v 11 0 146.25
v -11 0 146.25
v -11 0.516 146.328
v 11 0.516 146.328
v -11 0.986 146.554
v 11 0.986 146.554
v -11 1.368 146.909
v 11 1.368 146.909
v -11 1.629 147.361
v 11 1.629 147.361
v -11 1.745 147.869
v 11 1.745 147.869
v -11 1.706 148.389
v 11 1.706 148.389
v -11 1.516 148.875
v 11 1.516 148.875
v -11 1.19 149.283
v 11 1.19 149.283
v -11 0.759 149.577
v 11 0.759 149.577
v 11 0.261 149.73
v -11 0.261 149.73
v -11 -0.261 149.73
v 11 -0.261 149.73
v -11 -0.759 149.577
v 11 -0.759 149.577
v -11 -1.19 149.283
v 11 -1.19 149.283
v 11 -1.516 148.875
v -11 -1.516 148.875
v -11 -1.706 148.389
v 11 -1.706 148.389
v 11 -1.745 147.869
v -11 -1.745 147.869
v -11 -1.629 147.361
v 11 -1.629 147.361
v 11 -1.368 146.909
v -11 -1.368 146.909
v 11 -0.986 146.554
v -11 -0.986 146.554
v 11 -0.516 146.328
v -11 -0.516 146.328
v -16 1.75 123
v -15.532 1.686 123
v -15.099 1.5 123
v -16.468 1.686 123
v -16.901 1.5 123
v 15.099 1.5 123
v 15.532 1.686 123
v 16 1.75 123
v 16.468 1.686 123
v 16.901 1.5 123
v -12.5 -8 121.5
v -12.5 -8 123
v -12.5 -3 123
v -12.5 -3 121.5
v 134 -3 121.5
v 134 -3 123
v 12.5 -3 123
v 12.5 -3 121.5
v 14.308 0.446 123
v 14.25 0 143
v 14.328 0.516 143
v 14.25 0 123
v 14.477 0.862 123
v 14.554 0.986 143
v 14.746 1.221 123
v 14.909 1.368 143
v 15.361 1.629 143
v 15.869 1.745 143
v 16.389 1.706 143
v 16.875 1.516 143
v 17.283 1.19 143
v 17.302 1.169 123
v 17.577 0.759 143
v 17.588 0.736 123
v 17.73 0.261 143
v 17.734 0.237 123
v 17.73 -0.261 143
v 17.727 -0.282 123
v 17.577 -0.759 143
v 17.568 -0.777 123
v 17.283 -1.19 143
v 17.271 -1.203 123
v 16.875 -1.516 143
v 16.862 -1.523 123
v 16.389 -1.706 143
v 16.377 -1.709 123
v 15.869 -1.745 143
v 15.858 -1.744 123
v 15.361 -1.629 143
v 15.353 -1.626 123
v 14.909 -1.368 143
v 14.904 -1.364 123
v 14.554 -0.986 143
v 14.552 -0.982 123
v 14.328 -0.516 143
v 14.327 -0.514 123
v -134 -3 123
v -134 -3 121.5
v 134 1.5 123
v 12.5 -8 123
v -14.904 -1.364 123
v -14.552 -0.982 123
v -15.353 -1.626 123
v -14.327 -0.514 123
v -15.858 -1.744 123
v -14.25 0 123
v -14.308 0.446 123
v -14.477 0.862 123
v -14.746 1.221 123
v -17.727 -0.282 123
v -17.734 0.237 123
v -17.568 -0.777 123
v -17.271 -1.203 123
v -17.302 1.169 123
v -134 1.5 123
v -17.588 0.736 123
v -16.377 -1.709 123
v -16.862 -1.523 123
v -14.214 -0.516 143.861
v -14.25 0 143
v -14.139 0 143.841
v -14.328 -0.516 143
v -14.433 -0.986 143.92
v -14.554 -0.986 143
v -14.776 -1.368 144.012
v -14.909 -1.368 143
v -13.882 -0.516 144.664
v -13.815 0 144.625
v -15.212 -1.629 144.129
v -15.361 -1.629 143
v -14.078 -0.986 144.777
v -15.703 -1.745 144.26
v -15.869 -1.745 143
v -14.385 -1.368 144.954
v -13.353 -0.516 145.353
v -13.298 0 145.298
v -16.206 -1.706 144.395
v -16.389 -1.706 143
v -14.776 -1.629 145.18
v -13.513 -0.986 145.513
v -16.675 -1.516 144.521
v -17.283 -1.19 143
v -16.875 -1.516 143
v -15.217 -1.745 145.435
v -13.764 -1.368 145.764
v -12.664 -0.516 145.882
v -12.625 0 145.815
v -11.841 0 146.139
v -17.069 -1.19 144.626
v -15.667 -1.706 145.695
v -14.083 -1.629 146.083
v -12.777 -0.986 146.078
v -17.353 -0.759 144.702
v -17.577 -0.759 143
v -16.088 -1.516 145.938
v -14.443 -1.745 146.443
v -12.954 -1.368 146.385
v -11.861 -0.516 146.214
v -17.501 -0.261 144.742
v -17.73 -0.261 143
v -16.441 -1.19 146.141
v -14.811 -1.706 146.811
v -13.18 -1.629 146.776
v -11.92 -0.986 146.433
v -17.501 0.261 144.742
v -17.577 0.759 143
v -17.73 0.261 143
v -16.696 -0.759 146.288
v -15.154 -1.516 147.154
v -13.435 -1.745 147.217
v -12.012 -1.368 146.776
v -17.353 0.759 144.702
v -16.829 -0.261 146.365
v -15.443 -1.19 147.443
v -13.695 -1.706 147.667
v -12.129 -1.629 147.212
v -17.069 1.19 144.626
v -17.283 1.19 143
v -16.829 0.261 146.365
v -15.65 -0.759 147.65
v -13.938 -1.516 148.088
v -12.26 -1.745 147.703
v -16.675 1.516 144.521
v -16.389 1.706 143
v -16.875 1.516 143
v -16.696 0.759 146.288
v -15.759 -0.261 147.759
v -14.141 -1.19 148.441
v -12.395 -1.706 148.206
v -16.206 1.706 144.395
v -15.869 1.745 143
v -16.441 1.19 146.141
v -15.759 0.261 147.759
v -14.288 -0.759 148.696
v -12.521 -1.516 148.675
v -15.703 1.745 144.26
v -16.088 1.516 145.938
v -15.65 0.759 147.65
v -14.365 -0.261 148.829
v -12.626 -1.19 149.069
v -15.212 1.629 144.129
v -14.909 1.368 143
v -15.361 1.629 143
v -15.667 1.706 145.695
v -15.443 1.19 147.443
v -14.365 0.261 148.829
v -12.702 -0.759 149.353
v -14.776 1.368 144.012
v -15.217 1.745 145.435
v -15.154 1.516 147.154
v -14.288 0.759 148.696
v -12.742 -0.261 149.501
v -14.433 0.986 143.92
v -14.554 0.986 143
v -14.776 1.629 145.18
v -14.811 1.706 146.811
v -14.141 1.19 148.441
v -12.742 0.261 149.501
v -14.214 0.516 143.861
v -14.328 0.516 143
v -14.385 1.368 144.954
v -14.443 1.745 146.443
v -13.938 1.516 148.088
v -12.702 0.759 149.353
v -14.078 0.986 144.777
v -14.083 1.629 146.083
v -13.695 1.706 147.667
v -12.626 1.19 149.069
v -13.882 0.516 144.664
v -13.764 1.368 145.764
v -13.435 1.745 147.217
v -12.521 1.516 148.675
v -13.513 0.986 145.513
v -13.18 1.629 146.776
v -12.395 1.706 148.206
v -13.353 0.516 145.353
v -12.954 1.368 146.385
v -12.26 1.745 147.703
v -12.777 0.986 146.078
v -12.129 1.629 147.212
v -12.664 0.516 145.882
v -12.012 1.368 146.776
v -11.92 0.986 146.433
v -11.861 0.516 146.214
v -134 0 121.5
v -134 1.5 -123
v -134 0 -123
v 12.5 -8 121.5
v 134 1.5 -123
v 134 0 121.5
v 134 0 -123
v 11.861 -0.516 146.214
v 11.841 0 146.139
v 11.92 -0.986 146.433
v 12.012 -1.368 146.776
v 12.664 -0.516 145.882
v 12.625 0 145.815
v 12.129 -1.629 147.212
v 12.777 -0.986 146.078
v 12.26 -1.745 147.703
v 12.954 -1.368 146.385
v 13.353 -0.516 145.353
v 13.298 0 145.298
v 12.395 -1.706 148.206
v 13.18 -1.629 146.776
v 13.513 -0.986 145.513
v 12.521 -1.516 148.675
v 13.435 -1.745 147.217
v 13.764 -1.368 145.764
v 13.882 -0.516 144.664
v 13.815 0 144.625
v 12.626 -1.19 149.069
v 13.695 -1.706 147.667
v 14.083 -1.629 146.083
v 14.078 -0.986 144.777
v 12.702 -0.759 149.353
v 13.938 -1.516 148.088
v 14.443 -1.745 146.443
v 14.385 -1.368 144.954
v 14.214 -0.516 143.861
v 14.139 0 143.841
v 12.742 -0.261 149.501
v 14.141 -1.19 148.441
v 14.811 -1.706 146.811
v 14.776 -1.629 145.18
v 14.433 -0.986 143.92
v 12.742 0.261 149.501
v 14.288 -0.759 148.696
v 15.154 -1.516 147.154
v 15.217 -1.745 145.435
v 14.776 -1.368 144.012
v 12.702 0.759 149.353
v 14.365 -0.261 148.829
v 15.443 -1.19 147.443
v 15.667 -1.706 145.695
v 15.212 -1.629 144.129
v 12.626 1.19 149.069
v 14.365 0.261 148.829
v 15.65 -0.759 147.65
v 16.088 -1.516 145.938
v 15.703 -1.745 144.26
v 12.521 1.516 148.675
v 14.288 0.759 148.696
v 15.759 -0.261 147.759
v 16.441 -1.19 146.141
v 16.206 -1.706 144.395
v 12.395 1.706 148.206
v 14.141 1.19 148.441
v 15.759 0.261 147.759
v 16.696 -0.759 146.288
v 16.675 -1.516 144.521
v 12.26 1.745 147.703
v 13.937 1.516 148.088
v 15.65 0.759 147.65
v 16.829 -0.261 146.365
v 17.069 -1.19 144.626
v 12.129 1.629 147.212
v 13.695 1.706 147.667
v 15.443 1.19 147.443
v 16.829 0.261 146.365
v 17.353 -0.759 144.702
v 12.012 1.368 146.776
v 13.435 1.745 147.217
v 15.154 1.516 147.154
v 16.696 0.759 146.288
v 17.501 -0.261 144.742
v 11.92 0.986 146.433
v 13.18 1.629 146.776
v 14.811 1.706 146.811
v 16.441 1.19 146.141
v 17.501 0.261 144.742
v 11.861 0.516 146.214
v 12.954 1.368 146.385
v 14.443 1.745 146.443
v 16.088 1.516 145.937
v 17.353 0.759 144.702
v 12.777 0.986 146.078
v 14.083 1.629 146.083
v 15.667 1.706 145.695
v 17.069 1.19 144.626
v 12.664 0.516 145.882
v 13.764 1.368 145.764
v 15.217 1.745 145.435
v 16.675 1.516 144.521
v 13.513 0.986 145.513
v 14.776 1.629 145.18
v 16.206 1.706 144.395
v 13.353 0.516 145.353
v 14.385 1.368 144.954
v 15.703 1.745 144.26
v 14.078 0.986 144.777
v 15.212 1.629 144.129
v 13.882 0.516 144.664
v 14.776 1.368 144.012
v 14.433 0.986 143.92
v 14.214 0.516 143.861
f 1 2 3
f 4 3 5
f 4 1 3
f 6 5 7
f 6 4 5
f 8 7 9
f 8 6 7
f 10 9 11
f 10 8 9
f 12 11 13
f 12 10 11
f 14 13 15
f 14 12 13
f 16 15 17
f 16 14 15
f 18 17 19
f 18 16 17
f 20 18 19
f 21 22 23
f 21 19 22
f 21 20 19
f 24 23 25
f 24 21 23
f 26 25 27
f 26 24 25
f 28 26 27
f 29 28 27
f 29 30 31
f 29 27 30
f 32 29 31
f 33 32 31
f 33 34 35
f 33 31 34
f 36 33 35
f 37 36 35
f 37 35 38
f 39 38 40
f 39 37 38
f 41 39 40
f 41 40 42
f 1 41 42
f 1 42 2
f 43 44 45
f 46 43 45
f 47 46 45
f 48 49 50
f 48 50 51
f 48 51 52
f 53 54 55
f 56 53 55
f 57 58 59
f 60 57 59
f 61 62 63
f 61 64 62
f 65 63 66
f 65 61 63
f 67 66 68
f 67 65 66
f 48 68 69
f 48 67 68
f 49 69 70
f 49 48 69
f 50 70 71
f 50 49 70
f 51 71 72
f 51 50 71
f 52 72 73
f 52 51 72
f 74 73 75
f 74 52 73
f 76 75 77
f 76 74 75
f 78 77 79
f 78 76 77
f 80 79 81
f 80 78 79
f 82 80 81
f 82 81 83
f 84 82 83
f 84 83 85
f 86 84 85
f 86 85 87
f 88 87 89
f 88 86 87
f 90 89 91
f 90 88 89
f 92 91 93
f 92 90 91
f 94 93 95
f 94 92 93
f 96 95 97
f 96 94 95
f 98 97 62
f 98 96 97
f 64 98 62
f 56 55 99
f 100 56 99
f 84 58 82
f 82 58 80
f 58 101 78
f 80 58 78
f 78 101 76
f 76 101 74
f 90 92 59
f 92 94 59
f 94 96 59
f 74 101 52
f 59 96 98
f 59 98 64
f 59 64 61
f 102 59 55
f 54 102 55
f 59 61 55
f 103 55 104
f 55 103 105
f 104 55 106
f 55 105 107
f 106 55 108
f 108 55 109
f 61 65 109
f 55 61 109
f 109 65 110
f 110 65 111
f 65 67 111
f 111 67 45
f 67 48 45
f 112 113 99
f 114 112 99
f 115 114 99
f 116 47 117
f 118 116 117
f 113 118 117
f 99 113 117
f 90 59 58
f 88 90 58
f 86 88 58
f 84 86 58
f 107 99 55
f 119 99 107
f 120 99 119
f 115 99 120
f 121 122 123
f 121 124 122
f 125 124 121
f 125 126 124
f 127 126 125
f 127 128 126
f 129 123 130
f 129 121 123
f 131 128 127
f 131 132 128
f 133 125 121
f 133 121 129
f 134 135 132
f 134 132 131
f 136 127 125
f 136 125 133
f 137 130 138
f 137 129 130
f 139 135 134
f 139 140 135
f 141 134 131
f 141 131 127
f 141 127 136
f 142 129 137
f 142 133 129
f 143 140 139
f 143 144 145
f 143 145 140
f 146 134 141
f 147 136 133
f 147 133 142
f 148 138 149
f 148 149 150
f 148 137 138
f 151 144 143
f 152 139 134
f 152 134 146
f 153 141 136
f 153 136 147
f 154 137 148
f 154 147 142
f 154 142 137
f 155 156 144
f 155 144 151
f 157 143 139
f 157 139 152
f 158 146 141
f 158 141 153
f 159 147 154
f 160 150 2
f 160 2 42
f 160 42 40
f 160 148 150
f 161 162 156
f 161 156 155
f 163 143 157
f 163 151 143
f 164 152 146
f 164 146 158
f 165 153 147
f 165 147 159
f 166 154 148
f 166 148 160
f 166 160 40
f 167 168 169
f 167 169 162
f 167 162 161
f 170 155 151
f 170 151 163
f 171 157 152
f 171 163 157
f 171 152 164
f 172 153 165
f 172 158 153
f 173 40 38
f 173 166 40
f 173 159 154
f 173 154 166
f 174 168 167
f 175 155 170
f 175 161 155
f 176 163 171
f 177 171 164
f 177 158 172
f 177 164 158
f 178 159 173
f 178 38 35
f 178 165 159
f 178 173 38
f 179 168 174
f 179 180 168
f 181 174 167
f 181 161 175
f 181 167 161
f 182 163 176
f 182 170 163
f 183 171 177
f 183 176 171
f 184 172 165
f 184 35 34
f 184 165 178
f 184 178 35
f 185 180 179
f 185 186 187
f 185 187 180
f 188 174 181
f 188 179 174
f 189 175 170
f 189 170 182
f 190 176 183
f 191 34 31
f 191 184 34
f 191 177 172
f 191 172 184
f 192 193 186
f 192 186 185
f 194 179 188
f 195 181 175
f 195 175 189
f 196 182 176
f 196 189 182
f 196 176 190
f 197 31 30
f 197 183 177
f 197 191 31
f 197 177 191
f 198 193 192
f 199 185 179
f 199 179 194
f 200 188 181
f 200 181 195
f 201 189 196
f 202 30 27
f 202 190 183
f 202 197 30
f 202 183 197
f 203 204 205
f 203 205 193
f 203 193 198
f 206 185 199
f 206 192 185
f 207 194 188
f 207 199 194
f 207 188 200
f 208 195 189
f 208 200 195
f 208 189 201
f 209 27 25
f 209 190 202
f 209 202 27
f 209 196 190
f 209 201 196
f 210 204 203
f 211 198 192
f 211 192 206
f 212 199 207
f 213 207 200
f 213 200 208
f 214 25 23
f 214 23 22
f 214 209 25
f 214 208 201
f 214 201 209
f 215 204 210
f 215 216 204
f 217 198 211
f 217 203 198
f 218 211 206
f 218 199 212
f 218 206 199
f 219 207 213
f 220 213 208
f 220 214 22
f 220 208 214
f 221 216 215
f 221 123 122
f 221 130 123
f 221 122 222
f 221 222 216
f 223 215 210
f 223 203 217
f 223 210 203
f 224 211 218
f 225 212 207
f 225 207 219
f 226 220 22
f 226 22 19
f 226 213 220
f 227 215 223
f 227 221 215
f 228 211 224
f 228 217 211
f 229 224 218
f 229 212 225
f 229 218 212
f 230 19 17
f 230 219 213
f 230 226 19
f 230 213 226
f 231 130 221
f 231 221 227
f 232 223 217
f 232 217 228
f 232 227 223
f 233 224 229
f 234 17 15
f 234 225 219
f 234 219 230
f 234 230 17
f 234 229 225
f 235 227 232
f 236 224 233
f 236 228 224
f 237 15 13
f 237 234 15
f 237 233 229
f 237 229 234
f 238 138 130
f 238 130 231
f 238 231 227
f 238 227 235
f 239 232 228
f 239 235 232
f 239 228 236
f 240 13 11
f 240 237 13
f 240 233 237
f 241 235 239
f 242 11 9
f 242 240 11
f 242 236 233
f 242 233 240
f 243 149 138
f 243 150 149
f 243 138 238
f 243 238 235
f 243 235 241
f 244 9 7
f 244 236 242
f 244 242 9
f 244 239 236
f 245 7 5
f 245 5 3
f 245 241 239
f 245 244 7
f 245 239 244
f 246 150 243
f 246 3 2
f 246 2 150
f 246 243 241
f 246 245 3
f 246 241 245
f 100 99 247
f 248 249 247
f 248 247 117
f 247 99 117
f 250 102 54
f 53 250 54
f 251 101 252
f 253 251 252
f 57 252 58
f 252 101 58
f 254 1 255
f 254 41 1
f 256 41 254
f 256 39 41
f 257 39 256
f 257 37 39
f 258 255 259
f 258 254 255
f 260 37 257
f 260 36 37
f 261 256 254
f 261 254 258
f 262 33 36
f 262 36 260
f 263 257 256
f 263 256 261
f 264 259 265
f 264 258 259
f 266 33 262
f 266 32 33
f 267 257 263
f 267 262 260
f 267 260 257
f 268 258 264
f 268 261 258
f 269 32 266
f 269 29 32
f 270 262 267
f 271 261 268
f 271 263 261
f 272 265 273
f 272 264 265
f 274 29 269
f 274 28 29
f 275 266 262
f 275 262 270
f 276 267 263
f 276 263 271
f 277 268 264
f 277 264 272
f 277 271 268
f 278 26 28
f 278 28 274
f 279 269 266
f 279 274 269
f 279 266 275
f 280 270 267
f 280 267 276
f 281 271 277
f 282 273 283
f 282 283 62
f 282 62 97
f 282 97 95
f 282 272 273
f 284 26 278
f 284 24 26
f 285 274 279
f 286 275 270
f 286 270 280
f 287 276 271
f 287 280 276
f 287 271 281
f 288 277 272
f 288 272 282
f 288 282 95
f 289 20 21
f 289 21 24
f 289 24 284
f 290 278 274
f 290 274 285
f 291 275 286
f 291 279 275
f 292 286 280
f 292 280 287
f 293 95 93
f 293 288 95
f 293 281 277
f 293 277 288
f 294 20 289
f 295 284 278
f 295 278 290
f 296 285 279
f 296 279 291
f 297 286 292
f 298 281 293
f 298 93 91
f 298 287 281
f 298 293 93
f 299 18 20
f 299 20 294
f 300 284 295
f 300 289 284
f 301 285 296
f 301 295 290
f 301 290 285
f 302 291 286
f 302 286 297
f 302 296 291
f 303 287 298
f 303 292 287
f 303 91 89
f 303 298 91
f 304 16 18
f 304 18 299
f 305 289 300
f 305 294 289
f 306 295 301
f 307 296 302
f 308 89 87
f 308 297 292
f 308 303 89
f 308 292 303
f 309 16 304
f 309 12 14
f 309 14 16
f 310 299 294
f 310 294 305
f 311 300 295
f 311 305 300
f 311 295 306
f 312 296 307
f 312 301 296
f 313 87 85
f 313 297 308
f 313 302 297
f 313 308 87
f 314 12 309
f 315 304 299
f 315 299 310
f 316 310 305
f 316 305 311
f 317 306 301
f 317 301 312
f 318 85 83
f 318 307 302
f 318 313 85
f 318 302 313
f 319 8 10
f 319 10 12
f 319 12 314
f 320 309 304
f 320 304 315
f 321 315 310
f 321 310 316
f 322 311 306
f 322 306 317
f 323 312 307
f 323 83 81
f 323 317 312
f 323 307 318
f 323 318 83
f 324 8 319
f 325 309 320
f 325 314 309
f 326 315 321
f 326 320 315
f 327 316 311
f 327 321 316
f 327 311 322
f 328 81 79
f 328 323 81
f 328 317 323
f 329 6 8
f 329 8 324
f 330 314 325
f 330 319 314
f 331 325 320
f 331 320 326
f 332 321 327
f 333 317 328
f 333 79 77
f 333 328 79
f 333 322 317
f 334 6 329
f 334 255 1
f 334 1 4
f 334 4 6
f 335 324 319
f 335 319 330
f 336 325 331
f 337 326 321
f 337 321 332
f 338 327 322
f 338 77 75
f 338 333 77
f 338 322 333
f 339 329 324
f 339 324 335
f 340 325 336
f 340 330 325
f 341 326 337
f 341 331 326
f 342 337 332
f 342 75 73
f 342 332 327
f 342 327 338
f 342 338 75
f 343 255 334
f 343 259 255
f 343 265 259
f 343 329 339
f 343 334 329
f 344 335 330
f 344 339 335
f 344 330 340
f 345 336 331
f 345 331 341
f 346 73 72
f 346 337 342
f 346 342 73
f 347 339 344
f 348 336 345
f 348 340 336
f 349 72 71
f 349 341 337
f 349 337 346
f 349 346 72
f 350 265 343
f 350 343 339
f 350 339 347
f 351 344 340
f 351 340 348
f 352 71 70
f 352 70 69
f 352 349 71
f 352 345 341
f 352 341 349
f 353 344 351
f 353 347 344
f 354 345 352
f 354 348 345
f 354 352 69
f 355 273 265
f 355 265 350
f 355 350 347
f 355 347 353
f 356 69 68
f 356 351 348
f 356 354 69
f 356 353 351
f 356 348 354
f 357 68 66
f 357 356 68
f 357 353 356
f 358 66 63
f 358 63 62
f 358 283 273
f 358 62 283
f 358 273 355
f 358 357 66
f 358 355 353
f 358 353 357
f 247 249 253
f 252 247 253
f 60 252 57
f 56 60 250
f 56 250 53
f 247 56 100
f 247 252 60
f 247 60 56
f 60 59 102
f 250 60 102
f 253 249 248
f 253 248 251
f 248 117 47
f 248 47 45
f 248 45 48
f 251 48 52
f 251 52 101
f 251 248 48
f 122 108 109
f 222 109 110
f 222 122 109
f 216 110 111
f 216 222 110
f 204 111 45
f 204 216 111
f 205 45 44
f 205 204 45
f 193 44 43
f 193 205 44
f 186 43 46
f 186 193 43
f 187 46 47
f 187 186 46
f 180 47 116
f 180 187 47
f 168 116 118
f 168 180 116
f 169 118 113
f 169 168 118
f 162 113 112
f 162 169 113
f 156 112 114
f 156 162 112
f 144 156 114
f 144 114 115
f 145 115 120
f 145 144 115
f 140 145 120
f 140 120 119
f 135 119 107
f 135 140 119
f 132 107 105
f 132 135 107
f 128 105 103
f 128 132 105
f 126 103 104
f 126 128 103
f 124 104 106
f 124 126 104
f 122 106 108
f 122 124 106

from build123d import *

# Parameters (mm, degrees)
SKETCH1_W           = 268
SKETCH1_H           = 246
BOSS_EXTRUDE1_DEPTH = 1.5
BOSS_EXTRUDE2_DEPTH = 1.5
SWEEP1_PROFILE_R    = 1.75


with BuildPart() as part:
    # Sketch1 → Boss-Extrude1 (new body)
    with BuildSketch(Plane(origin=(0, 0, 0), x_dir=(1, 0, 0), z_dir=(0, 1, 0))):
        Rectangle(SKETCH1_W, SKETCH1_H)
    extrude(amount=BOSS_EXTRUDE1_DEPTH)

    # Sketch2 → Boss-Extrude2 (add)
    with BuildSketch(Plane.XY.offset(123)):
        Polygon((-134, 0), (134, 0), (134, -3), (12.5, -3), (12.5, -8), (-12.5, -8), (-12.5, -3), (-134, -3), align=None)
    extrude(amount=-BOSS_EXTRUDE2_DEPTH)

    # Sweep1: sweep along a path in Sketch3
    with BuildLine(Plane(origin=(0, 0, 0), x_dir=(1, 0, 0), z_dir=(0, 1, 0))) as sweep1_path:
        Line((-16, -123), (-16, -143))
        ThreePointArc((-16, -143), (-14.535533906, -146.535533906), (-11, -148))
        Line((-11, -148), (11, -148))
        ThreePointArc((11, -148), (14.535533906, -146.535533906), (16, -143))
        Line((16, -143), (16, -123))
    # Sweep1 profile (on start of the path) → Sweep1 (sweep)
    with BuildSketch(Plane(origin=(-16, 0, 123), x_dir=(1, 0, 0), z_dir=(0, 0, 1))):
        Circle(SWEEP1_PROFILE_R)
    sweep(path=sweep1_path.line)


solid = part.part
